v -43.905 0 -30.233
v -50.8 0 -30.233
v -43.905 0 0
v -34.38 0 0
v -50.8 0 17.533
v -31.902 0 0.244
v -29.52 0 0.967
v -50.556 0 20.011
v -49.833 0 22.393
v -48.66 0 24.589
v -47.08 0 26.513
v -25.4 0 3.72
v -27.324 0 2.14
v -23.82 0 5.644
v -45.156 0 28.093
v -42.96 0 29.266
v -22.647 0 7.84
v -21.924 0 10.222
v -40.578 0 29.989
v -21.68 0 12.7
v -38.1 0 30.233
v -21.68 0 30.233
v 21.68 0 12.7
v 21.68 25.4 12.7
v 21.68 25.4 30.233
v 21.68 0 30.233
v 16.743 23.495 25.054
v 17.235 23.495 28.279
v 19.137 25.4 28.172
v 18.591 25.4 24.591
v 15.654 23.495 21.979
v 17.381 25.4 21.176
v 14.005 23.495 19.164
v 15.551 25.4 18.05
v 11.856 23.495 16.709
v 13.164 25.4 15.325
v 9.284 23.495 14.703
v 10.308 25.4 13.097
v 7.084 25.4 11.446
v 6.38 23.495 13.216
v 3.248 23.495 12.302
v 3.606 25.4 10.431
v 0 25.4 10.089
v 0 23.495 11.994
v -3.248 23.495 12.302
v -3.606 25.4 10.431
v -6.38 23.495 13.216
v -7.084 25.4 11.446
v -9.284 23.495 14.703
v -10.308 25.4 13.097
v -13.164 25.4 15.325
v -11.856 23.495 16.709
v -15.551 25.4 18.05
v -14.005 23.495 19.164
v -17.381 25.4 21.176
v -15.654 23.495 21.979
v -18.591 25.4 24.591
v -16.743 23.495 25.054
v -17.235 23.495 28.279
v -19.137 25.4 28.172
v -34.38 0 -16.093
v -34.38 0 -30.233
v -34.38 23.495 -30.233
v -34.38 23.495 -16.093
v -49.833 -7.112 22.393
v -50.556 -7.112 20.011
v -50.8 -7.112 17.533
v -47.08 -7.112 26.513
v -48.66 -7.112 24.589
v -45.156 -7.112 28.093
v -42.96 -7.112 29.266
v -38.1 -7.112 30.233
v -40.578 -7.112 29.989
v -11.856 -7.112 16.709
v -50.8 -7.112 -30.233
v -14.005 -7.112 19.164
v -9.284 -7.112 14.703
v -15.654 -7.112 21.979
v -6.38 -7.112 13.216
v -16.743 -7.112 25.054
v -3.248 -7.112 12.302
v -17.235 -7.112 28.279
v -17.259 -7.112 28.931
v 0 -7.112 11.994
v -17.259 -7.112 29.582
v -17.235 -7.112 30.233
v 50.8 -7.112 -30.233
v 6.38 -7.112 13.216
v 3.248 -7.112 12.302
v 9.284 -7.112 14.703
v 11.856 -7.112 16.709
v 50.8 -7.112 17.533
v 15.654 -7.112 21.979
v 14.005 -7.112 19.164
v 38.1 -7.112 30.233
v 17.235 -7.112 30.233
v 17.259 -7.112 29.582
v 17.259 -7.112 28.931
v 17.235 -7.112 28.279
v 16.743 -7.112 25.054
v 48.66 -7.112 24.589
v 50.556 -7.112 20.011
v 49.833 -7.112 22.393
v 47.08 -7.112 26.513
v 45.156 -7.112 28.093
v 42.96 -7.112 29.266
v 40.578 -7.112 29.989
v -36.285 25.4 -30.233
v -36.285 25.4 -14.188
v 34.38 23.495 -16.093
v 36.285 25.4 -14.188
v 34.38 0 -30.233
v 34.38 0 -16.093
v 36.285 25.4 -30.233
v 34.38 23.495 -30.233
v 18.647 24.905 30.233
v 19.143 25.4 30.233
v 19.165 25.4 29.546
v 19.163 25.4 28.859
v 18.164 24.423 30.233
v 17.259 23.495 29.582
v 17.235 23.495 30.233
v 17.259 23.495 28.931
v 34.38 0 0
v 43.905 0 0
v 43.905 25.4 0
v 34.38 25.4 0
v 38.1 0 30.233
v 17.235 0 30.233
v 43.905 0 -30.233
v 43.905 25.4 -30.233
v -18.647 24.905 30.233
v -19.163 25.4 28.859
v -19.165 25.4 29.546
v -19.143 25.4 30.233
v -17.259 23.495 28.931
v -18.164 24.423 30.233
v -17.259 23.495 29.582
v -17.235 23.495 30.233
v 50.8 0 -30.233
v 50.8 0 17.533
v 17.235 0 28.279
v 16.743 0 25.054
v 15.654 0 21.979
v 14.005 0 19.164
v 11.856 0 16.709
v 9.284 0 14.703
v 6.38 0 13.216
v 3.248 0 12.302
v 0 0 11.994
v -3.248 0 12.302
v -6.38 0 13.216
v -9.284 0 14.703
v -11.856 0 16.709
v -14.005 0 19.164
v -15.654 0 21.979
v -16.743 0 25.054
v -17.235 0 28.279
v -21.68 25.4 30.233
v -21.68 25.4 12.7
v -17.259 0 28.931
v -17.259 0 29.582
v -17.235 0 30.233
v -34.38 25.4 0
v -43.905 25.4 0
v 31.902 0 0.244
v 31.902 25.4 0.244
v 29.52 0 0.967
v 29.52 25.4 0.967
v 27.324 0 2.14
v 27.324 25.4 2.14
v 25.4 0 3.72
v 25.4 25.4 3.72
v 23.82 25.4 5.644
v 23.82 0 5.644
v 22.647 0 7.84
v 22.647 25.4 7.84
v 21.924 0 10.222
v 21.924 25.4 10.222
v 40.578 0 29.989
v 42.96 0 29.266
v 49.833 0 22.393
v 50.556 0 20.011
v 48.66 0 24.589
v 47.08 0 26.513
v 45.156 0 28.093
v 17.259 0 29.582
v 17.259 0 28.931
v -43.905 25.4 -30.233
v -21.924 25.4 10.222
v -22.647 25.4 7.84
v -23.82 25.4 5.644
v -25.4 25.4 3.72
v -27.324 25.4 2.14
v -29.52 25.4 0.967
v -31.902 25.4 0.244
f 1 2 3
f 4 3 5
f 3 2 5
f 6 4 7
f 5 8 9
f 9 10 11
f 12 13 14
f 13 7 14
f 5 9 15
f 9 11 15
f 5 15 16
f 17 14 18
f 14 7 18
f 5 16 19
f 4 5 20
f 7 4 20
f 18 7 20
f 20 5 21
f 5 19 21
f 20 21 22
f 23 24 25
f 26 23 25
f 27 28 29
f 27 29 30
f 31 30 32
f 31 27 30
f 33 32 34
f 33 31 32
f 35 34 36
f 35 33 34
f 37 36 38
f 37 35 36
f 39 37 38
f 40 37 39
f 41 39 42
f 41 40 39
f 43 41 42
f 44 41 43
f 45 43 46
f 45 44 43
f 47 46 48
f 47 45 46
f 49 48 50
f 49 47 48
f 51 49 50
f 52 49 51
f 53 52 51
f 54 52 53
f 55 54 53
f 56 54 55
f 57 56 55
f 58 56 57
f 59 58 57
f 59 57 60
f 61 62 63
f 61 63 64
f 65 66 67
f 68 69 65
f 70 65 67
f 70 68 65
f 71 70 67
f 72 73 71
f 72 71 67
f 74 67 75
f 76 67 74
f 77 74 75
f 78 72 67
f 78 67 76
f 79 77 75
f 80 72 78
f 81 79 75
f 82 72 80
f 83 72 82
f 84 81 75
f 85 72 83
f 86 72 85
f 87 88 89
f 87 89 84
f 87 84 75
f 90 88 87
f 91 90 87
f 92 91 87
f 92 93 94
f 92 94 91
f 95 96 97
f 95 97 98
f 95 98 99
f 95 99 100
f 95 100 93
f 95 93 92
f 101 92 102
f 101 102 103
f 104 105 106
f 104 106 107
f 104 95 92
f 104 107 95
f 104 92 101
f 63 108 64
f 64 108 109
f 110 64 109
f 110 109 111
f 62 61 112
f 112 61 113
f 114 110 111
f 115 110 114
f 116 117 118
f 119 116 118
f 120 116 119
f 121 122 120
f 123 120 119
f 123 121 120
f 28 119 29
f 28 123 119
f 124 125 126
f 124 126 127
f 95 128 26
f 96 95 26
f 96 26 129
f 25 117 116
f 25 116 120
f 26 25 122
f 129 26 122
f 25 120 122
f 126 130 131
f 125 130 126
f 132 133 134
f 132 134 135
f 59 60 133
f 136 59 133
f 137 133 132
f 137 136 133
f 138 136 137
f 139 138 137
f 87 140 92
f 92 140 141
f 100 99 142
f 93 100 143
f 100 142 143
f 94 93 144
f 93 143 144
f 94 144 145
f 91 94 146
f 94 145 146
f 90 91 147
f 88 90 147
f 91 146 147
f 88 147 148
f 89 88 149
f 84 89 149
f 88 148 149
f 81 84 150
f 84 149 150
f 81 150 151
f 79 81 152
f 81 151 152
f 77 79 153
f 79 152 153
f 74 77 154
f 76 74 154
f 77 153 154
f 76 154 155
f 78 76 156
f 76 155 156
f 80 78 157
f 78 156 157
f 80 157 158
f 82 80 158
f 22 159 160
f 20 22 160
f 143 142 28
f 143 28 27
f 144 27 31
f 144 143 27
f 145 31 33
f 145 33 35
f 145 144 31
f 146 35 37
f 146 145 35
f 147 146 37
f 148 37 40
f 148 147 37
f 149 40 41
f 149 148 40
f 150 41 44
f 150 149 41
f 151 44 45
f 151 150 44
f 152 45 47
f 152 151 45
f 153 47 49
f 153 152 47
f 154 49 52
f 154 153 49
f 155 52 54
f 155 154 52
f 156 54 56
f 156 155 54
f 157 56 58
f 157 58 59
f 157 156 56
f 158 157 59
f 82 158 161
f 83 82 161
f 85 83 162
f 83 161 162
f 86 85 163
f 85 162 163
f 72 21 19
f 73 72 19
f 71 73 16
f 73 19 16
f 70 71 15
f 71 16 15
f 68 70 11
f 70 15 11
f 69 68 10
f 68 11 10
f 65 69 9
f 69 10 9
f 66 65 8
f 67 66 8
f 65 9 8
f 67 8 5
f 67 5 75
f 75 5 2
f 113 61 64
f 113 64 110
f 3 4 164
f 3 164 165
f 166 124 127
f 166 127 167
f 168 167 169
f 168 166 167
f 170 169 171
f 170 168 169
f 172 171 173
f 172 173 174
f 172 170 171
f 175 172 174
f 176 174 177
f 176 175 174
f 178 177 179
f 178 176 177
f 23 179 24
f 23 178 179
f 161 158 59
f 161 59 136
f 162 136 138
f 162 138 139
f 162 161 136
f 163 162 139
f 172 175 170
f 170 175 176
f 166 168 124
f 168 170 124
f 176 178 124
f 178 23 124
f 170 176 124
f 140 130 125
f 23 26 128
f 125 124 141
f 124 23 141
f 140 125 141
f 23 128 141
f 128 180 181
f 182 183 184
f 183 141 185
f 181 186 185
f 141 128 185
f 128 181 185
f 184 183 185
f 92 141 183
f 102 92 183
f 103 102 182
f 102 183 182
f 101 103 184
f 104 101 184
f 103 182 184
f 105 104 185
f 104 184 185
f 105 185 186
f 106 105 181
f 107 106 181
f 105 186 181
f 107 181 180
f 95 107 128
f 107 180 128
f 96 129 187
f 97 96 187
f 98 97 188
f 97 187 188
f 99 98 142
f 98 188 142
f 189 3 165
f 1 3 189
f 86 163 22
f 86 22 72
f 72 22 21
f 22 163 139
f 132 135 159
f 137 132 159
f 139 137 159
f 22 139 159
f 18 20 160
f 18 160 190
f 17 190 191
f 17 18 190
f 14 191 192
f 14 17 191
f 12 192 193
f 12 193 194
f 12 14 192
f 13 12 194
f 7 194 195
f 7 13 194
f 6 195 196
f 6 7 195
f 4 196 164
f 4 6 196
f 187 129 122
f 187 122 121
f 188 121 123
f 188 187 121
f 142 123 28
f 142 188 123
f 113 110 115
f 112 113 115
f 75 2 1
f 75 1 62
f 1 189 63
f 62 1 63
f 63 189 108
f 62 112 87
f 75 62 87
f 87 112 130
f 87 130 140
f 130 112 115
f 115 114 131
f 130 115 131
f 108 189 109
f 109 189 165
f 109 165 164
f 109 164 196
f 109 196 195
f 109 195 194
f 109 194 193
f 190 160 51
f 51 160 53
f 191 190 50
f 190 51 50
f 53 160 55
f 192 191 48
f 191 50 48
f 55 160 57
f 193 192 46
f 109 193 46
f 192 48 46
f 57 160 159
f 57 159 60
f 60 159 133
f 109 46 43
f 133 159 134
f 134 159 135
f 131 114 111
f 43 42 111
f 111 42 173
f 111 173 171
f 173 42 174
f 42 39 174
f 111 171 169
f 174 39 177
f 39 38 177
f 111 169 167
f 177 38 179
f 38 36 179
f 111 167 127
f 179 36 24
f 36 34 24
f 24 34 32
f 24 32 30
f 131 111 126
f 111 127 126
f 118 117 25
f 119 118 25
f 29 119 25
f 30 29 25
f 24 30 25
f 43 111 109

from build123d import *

# Parameters (mm, degrees)
F1_DEPTH = 7.112
F3_DEPTH = 25.4
F4_SIZE  = 1.905
F5_DEPTH = 25.4
F6_SIZE  = 1.905


with BuildPart() as f1:
    # F0 (on Front) → F1 (new body)
    with BuildSketch(Plane.XZ):
        with BuildLine():
            Line((-50.8, -30.2332285792), (50.8, -30.2332285792))
            Line((50.8, -30.2332285792), (50.8, 17.5332285792))
            ThreePointArc((50.8, 17.5332285792), (47.0802561211, 26.5134847002), (38.1, 30.2332285792))
            Line((38.1, 30.2332285792), (-38.1, 30.2332285792))
            ThreePointArc((-38.1, 30.2332285792), (-47.0802561211, 26.5134847002), (-50.8, 17.5332285792))
            Line((-50.8, 17.5332285792), (-50.8, -30.2332285792))
        make_face()
    extrude(amount=F1_DEPTH)

    # F2 (on Front) → F3 (join)
    with BuildSketch(Plane.XZ):
        with BuildLine():
            Line((-43.9048968256, 0), (-43.9048968256, -30.2332285792))
            Line((-43.9048968256, -30.2332285792), (-34.3798968256, -30.2332285792))
            Line((-34.3798968256, -30.2332285792), (-34.3798968256, -16.0933099687))
            Line((-34.3798968256, -16.0933099687), (0, -16.0933099687))
            Line((0, -16.0933099687), (34.3798968256, -16.0933099687))
            Line((34.3798968256, -16.0933099687), (34.3798968256, -30.2332285792))
            Line((34.3798968256, -30.2332285792), (43.9048968256, -30.2332285792))
            Line((43.9048968256, -30.2332285792), (43.9048968256, 0))
            Line((43.9048968256, 0), (34.3798968256, 0))
            ThreePointArc((34.3798968256, 0), (25.3996407045, 3.7197438789), (21.6798968256, 12.7))
            Line((21.6798968256, 12.7), (21.6798968256, 30.2332285792))
            Line((21.6798968256, 30.2332285792), (17.2348968256, 30.2332285792))
            ThreePointArc((17.2348968256, 30.2332285792), (17.2625602078, 29.2563374186), (17.2348968256, 28.2794462581))
            ThreePointArc((17.2348968256, 28.2794462581), (0, 11.9937772108), (-17.2348968256, 28.2794462581))
            ThreePointArc((-17.2348968256, 28.2794462581), (-17.2625602078, 29.2563374186), (-17.2348968256, 30.2332285792))
            Line((-17.2348968256, 30.2332285792), (-21.6798968256, 30.2332285792))
            Line((-21.6798968256, 30.2332285792), (-21.6798968256, 12.7))
            ThreePointArc((-21.6798968256, 12.7), (-25.3996407045, 3.7197438789), (-34.3798968256, 0))
            Line((-34.3798968256, 0), (-43.9048968256, 0))
        make_face()
    extrude(amount=-F3_DEPTH)

    # F4
    f4_edges = [f1.edges().sort_by_distance(p)[0] for p in [
        (34.379897, 25.4, -23.163269),
        (0, 25.4, -16.09331),
        (-34.379897, 25.4, -23.163269),
    ]]
    chamfer(f4_edges, length=F4_SIZE)

    # F5 (cut): a face of the model
    f5_faces = [f1.faces().sort_by_distance(p)[0] for p in [
        (0, 0, 22.4548498087),
    ]]
    extrude(f5_faces, amount=-F5_DEPTH, mode=Mode.SUBTRACT)

    # F6
    f6_edges = [f1.edges().sort_by_distance(p)[0] for p in [
        (0.976891, 25.4, 12.021441),
    ]]
    chamfer(f6_edges, length=F6_SIZE)


solid = f1.part
